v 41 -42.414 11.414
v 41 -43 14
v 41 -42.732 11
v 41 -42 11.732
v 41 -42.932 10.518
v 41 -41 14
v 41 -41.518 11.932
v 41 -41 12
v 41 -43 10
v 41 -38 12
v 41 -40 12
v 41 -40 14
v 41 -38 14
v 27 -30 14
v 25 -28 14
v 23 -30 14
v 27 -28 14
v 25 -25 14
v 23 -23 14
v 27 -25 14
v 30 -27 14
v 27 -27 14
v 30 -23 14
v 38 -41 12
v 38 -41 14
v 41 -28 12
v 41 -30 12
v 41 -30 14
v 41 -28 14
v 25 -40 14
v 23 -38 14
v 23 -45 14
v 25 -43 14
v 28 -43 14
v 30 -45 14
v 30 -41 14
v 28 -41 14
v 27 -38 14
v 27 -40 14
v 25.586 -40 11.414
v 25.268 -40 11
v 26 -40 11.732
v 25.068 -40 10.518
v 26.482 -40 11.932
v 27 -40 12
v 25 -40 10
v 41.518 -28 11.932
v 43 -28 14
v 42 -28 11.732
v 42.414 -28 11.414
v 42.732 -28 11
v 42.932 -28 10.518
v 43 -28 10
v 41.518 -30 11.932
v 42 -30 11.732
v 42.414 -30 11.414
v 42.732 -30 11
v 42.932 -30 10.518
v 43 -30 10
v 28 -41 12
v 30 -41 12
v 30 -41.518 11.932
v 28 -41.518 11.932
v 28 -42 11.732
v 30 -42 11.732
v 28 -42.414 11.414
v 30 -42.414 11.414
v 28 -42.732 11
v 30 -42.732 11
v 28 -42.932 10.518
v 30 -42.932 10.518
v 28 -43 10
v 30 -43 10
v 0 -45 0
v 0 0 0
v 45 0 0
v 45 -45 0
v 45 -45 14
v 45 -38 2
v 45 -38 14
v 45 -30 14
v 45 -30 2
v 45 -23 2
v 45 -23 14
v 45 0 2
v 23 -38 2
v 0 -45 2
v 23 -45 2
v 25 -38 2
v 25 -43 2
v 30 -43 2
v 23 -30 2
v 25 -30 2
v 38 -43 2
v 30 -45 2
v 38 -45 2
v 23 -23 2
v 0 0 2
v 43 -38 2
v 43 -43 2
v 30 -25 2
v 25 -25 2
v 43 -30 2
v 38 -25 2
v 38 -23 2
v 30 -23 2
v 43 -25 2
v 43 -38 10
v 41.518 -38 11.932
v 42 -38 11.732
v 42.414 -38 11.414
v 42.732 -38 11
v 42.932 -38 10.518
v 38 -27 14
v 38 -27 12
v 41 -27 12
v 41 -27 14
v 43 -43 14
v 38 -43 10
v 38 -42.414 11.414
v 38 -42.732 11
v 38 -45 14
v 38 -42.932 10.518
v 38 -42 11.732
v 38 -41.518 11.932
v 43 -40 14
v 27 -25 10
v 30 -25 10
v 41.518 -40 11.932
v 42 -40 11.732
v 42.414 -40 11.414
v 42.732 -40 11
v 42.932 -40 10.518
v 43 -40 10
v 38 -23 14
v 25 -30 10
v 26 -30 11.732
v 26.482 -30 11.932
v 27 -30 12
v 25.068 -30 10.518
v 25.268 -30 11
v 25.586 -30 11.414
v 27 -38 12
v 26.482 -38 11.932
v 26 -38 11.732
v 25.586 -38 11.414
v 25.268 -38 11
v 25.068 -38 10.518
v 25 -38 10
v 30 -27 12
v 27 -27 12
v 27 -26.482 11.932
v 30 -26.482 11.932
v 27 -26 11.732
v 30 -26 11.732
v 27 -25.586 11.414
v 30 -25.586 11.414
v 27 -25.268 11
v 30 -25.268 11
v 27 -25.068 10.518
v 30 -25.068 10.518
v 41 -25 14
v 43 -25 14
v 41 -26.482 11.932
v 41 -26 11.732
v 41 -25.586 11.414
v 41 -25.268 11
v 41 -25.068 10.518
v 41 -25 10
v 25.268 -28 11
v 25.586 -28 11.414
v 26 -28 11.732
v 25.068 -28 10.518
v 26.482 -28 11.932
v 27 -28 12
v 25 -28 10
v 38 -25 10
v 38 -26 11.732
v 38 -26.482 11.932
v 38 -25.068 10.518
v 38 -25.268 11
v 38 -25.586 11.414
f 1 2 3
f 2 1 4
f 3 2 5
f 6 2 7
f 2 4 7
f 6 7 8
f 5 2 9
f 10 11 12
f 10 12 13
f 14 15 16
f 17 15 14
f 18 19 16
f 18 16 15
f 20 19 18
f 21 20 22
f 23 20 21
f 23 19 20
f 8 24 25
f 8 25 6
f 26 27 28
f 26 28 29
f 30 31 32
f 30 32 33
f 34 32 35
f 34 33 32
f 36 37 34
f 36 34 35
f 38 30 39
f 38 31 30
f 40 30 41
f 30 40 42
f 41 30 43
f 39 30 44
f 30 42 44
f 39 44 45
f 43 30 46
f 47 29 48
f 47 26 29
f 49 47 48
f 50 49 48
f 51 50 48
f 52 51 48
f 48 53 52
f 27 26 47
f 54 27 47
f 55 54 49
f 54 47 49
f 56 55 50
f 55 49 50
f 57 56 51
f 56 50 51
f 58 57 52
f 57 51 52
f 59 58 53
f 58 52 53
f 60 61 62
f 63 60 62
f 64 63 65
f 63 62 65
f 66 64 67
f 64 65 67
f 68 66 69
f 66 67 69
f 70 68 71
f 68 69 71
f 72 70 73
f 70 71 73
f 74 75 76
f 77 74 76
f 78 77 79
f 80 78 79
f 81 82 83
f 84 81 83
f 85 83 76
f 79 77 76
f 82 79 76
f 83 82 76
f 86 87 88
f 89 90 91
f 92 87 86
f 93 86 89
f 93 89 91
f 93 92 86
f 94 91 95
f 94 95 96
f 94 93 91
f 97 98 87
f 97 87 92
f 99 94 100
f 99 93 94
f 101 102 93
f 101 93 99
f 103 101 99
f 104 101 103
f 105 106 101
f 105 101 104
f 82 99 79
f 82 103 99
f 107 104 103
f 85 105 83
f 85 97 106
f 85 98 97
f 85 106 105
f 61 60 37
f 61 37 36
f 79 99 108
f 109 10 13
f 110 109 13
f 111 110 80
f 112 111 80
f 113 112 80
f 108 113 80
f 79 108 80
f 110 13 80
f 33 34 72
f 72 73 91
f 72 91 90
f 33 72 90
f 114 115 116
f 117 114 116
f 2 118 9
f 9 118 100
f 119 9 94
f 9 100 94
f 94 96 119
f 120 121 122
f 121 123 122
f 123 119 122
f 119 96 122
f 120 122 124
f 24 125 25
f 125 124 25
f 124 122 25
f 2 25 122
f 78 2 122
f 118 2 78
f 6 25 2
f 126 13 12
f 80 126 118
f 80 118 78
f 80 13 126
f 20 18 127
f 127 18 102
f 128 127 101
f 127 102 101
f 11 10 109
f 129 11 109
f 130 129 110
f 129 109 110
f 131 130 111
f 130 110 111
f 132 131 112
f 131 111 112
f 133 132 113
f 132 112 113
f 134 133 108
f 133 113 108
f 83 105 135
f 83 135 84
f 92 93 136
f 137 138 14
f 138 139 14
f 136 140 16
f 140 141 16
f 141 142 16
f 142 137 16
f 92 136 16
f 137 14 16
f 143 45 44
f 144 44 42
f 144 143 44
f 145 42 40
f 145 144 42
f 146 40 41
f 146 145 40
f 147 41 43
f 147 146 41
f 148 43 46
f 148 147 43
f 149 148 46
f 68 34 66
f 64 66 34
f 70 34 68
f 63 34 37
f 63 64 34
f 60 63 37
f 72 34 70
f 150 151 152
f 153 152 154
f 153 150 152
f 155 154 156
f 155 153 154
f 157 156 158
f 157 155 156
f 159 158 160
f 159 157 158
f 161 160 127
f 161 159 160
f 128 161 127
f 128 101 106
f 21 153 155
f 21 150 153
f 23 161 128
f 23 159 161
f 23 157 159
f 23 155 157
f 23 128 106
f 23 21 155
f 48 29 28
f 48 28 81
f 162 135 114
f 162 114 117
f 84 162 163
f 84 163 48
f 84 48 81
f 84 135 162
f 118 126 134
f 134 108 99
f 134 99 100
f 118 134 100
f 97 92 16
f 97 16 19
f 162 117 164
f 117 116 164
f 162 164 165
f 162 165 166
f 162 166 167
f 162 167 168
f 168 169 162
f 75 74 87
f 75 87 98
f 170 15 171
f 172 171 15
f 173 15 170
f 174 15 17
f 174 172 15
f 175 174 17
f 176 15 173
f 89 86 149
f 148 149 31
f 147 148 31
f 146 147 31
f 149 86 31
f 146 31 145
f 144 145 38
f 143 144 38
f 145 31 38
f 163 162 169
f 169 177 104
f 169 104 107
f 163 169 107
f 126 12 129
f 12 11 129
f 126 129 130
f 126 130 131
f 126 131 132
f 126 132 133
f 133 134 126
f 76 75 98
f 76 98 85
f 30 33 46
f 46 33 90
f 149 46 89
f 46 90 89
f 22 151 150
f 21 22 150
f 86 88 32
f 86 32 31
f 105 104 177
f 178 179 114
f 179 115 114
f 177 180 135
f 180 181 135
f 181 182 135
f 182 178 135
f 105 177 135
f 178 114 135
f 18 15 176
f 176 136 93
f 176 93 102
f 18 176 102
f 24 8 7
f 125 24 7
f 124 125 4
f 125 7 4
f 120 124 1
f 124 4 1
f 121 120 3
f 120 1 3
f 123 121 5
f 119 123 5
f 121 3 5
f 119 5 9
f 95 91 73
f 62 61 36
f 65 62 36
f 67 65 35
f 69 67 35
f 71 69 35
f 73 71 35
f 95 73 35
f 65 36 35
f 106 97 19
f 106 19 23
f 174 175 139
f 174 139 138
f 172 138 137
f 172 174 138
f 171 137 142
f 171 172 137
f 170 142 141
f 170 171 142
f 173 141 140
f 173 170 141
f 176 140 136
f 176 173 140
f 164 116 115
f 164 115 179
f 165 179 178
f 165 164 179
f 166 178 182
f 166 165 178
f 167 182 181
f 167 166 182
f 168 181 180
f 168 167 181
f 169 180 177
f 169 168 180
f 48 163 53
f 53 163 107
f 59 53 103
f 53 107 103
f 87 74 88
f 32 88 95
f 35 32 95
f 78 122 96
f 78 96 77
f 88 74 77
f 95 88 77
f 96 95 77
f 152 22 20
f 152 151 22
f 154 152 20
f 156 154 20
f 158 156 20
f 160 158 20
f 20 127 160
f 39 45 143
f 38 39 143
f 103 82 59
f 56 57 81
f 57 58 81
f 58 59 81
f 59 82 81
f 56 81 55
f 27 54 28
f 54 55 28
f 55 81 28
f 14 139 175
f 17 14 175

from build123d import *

# Parameters (mm, degrees)
F0_W     = 45
F0_H     = 45
F1_DEPTH = 2
F2_W     = 22
F2_H     = 22
F2_W_2   = 18
F2_H_2   = 18
F3_DEPTH = 10
F4_W     = 22
F4_H     = 22
F4_W_2   = 2
F4_H_2   = 12
F4_W_3   = 14
F4_H_3   = 2
F4_W_4   = 13
F5_DEPTH = 2
F6_R     = 1.99999
F7_W     = 11
F7_H     = 8
F7_W_2   = 8
F7_H_2   = 11
F8_DEPTH = 12


# Not quite as in the source:
# - a fillet or chamfer is up to 0.001 mm smaller than in the source, because OpenCascade refuses the exact size


with BuildPart() as f1:
    # F0 (on Top) → F1 (new body)
    with BuildSketch(Plane.XY):
        with Locations((22.5, -22.5)):
            Rectangle(F0_W, F0_H)
    extrude(amount=F1_DEPTH)

    # F2 (on face) → F3 (join)
    with BuildSketch(Plane.XY.offset(2)):
        with Locations((34, -34)):
            Rectangle(F2_W, F2_H)
        with Locations((34, -34)):
            Rectangle(F2_W_2, F2_H_2, mode=Mode.SUBTRACT)
    extrude(amount=F3_DEPTH)

    # F4 (on face) → F5 (join)
    with BuildSketch(Plane.XY.offset(12)):
        with Locations((34, -34)):
            Rectangle(F4_W, F4_H)
        Polygon((28, -43), (25, -43), (25, -40), (25, -28), (25, -25), (27, -25), (41, -25), (43, -25), (43, -28), (43, -40), (43, -43), (41, -43), align=None, mode=Mode.SUBTRACT)
        with Locations((26, -34)):
            Rectangle(F4_W_2, F4_H_2)
        with Locations((34, -26)):
            Rectangle(F4_W_3, F4_H_3)
        with Locations((42, -34)):
            Rectangle(F4_W_2, F4_H_2)
        with Locations((34.5, -42)):
            Rectangle(F4_W_4, F4_H_3)
    extrude(amount=F5_DEPTH)

    # F6 (radius 2 in the source; OpenCascade refuses exactly that, so slightly less here)
    f6_edges = [f1.edges().sort_by_distance(p)[0] for p in [
        (25, -34, 12),
        (43, -34, 12),
        (34, -25, 12),
        (34.5, -43, 12),
    ]]
    fillet(f6_edges, radius=F6_R)

    # F7 (on face) → F8 (cut, through all)
    with BuildSketch(Plane.XY.offset(14)):
        with Locations((43.5, -34)):
            Rectangle(F7_W, F7_H)
        with Locations((34, -43.5)):
            Rectangle(F7_W_2, F7_H_2)
        with Locations((34, -34)):
            Rectangle(F7_W_2, F7_H)
        with Locations((24.5, -34)):
            Rectangle(F7_W, F7_H)
        with Locations((34, -24.5)):
            Rectangle(F7_W_2, F7_H_2)
    extrude(amount=-F8_DEPTH, mode=Mode.SUBTRACT)


solid = f1.part
